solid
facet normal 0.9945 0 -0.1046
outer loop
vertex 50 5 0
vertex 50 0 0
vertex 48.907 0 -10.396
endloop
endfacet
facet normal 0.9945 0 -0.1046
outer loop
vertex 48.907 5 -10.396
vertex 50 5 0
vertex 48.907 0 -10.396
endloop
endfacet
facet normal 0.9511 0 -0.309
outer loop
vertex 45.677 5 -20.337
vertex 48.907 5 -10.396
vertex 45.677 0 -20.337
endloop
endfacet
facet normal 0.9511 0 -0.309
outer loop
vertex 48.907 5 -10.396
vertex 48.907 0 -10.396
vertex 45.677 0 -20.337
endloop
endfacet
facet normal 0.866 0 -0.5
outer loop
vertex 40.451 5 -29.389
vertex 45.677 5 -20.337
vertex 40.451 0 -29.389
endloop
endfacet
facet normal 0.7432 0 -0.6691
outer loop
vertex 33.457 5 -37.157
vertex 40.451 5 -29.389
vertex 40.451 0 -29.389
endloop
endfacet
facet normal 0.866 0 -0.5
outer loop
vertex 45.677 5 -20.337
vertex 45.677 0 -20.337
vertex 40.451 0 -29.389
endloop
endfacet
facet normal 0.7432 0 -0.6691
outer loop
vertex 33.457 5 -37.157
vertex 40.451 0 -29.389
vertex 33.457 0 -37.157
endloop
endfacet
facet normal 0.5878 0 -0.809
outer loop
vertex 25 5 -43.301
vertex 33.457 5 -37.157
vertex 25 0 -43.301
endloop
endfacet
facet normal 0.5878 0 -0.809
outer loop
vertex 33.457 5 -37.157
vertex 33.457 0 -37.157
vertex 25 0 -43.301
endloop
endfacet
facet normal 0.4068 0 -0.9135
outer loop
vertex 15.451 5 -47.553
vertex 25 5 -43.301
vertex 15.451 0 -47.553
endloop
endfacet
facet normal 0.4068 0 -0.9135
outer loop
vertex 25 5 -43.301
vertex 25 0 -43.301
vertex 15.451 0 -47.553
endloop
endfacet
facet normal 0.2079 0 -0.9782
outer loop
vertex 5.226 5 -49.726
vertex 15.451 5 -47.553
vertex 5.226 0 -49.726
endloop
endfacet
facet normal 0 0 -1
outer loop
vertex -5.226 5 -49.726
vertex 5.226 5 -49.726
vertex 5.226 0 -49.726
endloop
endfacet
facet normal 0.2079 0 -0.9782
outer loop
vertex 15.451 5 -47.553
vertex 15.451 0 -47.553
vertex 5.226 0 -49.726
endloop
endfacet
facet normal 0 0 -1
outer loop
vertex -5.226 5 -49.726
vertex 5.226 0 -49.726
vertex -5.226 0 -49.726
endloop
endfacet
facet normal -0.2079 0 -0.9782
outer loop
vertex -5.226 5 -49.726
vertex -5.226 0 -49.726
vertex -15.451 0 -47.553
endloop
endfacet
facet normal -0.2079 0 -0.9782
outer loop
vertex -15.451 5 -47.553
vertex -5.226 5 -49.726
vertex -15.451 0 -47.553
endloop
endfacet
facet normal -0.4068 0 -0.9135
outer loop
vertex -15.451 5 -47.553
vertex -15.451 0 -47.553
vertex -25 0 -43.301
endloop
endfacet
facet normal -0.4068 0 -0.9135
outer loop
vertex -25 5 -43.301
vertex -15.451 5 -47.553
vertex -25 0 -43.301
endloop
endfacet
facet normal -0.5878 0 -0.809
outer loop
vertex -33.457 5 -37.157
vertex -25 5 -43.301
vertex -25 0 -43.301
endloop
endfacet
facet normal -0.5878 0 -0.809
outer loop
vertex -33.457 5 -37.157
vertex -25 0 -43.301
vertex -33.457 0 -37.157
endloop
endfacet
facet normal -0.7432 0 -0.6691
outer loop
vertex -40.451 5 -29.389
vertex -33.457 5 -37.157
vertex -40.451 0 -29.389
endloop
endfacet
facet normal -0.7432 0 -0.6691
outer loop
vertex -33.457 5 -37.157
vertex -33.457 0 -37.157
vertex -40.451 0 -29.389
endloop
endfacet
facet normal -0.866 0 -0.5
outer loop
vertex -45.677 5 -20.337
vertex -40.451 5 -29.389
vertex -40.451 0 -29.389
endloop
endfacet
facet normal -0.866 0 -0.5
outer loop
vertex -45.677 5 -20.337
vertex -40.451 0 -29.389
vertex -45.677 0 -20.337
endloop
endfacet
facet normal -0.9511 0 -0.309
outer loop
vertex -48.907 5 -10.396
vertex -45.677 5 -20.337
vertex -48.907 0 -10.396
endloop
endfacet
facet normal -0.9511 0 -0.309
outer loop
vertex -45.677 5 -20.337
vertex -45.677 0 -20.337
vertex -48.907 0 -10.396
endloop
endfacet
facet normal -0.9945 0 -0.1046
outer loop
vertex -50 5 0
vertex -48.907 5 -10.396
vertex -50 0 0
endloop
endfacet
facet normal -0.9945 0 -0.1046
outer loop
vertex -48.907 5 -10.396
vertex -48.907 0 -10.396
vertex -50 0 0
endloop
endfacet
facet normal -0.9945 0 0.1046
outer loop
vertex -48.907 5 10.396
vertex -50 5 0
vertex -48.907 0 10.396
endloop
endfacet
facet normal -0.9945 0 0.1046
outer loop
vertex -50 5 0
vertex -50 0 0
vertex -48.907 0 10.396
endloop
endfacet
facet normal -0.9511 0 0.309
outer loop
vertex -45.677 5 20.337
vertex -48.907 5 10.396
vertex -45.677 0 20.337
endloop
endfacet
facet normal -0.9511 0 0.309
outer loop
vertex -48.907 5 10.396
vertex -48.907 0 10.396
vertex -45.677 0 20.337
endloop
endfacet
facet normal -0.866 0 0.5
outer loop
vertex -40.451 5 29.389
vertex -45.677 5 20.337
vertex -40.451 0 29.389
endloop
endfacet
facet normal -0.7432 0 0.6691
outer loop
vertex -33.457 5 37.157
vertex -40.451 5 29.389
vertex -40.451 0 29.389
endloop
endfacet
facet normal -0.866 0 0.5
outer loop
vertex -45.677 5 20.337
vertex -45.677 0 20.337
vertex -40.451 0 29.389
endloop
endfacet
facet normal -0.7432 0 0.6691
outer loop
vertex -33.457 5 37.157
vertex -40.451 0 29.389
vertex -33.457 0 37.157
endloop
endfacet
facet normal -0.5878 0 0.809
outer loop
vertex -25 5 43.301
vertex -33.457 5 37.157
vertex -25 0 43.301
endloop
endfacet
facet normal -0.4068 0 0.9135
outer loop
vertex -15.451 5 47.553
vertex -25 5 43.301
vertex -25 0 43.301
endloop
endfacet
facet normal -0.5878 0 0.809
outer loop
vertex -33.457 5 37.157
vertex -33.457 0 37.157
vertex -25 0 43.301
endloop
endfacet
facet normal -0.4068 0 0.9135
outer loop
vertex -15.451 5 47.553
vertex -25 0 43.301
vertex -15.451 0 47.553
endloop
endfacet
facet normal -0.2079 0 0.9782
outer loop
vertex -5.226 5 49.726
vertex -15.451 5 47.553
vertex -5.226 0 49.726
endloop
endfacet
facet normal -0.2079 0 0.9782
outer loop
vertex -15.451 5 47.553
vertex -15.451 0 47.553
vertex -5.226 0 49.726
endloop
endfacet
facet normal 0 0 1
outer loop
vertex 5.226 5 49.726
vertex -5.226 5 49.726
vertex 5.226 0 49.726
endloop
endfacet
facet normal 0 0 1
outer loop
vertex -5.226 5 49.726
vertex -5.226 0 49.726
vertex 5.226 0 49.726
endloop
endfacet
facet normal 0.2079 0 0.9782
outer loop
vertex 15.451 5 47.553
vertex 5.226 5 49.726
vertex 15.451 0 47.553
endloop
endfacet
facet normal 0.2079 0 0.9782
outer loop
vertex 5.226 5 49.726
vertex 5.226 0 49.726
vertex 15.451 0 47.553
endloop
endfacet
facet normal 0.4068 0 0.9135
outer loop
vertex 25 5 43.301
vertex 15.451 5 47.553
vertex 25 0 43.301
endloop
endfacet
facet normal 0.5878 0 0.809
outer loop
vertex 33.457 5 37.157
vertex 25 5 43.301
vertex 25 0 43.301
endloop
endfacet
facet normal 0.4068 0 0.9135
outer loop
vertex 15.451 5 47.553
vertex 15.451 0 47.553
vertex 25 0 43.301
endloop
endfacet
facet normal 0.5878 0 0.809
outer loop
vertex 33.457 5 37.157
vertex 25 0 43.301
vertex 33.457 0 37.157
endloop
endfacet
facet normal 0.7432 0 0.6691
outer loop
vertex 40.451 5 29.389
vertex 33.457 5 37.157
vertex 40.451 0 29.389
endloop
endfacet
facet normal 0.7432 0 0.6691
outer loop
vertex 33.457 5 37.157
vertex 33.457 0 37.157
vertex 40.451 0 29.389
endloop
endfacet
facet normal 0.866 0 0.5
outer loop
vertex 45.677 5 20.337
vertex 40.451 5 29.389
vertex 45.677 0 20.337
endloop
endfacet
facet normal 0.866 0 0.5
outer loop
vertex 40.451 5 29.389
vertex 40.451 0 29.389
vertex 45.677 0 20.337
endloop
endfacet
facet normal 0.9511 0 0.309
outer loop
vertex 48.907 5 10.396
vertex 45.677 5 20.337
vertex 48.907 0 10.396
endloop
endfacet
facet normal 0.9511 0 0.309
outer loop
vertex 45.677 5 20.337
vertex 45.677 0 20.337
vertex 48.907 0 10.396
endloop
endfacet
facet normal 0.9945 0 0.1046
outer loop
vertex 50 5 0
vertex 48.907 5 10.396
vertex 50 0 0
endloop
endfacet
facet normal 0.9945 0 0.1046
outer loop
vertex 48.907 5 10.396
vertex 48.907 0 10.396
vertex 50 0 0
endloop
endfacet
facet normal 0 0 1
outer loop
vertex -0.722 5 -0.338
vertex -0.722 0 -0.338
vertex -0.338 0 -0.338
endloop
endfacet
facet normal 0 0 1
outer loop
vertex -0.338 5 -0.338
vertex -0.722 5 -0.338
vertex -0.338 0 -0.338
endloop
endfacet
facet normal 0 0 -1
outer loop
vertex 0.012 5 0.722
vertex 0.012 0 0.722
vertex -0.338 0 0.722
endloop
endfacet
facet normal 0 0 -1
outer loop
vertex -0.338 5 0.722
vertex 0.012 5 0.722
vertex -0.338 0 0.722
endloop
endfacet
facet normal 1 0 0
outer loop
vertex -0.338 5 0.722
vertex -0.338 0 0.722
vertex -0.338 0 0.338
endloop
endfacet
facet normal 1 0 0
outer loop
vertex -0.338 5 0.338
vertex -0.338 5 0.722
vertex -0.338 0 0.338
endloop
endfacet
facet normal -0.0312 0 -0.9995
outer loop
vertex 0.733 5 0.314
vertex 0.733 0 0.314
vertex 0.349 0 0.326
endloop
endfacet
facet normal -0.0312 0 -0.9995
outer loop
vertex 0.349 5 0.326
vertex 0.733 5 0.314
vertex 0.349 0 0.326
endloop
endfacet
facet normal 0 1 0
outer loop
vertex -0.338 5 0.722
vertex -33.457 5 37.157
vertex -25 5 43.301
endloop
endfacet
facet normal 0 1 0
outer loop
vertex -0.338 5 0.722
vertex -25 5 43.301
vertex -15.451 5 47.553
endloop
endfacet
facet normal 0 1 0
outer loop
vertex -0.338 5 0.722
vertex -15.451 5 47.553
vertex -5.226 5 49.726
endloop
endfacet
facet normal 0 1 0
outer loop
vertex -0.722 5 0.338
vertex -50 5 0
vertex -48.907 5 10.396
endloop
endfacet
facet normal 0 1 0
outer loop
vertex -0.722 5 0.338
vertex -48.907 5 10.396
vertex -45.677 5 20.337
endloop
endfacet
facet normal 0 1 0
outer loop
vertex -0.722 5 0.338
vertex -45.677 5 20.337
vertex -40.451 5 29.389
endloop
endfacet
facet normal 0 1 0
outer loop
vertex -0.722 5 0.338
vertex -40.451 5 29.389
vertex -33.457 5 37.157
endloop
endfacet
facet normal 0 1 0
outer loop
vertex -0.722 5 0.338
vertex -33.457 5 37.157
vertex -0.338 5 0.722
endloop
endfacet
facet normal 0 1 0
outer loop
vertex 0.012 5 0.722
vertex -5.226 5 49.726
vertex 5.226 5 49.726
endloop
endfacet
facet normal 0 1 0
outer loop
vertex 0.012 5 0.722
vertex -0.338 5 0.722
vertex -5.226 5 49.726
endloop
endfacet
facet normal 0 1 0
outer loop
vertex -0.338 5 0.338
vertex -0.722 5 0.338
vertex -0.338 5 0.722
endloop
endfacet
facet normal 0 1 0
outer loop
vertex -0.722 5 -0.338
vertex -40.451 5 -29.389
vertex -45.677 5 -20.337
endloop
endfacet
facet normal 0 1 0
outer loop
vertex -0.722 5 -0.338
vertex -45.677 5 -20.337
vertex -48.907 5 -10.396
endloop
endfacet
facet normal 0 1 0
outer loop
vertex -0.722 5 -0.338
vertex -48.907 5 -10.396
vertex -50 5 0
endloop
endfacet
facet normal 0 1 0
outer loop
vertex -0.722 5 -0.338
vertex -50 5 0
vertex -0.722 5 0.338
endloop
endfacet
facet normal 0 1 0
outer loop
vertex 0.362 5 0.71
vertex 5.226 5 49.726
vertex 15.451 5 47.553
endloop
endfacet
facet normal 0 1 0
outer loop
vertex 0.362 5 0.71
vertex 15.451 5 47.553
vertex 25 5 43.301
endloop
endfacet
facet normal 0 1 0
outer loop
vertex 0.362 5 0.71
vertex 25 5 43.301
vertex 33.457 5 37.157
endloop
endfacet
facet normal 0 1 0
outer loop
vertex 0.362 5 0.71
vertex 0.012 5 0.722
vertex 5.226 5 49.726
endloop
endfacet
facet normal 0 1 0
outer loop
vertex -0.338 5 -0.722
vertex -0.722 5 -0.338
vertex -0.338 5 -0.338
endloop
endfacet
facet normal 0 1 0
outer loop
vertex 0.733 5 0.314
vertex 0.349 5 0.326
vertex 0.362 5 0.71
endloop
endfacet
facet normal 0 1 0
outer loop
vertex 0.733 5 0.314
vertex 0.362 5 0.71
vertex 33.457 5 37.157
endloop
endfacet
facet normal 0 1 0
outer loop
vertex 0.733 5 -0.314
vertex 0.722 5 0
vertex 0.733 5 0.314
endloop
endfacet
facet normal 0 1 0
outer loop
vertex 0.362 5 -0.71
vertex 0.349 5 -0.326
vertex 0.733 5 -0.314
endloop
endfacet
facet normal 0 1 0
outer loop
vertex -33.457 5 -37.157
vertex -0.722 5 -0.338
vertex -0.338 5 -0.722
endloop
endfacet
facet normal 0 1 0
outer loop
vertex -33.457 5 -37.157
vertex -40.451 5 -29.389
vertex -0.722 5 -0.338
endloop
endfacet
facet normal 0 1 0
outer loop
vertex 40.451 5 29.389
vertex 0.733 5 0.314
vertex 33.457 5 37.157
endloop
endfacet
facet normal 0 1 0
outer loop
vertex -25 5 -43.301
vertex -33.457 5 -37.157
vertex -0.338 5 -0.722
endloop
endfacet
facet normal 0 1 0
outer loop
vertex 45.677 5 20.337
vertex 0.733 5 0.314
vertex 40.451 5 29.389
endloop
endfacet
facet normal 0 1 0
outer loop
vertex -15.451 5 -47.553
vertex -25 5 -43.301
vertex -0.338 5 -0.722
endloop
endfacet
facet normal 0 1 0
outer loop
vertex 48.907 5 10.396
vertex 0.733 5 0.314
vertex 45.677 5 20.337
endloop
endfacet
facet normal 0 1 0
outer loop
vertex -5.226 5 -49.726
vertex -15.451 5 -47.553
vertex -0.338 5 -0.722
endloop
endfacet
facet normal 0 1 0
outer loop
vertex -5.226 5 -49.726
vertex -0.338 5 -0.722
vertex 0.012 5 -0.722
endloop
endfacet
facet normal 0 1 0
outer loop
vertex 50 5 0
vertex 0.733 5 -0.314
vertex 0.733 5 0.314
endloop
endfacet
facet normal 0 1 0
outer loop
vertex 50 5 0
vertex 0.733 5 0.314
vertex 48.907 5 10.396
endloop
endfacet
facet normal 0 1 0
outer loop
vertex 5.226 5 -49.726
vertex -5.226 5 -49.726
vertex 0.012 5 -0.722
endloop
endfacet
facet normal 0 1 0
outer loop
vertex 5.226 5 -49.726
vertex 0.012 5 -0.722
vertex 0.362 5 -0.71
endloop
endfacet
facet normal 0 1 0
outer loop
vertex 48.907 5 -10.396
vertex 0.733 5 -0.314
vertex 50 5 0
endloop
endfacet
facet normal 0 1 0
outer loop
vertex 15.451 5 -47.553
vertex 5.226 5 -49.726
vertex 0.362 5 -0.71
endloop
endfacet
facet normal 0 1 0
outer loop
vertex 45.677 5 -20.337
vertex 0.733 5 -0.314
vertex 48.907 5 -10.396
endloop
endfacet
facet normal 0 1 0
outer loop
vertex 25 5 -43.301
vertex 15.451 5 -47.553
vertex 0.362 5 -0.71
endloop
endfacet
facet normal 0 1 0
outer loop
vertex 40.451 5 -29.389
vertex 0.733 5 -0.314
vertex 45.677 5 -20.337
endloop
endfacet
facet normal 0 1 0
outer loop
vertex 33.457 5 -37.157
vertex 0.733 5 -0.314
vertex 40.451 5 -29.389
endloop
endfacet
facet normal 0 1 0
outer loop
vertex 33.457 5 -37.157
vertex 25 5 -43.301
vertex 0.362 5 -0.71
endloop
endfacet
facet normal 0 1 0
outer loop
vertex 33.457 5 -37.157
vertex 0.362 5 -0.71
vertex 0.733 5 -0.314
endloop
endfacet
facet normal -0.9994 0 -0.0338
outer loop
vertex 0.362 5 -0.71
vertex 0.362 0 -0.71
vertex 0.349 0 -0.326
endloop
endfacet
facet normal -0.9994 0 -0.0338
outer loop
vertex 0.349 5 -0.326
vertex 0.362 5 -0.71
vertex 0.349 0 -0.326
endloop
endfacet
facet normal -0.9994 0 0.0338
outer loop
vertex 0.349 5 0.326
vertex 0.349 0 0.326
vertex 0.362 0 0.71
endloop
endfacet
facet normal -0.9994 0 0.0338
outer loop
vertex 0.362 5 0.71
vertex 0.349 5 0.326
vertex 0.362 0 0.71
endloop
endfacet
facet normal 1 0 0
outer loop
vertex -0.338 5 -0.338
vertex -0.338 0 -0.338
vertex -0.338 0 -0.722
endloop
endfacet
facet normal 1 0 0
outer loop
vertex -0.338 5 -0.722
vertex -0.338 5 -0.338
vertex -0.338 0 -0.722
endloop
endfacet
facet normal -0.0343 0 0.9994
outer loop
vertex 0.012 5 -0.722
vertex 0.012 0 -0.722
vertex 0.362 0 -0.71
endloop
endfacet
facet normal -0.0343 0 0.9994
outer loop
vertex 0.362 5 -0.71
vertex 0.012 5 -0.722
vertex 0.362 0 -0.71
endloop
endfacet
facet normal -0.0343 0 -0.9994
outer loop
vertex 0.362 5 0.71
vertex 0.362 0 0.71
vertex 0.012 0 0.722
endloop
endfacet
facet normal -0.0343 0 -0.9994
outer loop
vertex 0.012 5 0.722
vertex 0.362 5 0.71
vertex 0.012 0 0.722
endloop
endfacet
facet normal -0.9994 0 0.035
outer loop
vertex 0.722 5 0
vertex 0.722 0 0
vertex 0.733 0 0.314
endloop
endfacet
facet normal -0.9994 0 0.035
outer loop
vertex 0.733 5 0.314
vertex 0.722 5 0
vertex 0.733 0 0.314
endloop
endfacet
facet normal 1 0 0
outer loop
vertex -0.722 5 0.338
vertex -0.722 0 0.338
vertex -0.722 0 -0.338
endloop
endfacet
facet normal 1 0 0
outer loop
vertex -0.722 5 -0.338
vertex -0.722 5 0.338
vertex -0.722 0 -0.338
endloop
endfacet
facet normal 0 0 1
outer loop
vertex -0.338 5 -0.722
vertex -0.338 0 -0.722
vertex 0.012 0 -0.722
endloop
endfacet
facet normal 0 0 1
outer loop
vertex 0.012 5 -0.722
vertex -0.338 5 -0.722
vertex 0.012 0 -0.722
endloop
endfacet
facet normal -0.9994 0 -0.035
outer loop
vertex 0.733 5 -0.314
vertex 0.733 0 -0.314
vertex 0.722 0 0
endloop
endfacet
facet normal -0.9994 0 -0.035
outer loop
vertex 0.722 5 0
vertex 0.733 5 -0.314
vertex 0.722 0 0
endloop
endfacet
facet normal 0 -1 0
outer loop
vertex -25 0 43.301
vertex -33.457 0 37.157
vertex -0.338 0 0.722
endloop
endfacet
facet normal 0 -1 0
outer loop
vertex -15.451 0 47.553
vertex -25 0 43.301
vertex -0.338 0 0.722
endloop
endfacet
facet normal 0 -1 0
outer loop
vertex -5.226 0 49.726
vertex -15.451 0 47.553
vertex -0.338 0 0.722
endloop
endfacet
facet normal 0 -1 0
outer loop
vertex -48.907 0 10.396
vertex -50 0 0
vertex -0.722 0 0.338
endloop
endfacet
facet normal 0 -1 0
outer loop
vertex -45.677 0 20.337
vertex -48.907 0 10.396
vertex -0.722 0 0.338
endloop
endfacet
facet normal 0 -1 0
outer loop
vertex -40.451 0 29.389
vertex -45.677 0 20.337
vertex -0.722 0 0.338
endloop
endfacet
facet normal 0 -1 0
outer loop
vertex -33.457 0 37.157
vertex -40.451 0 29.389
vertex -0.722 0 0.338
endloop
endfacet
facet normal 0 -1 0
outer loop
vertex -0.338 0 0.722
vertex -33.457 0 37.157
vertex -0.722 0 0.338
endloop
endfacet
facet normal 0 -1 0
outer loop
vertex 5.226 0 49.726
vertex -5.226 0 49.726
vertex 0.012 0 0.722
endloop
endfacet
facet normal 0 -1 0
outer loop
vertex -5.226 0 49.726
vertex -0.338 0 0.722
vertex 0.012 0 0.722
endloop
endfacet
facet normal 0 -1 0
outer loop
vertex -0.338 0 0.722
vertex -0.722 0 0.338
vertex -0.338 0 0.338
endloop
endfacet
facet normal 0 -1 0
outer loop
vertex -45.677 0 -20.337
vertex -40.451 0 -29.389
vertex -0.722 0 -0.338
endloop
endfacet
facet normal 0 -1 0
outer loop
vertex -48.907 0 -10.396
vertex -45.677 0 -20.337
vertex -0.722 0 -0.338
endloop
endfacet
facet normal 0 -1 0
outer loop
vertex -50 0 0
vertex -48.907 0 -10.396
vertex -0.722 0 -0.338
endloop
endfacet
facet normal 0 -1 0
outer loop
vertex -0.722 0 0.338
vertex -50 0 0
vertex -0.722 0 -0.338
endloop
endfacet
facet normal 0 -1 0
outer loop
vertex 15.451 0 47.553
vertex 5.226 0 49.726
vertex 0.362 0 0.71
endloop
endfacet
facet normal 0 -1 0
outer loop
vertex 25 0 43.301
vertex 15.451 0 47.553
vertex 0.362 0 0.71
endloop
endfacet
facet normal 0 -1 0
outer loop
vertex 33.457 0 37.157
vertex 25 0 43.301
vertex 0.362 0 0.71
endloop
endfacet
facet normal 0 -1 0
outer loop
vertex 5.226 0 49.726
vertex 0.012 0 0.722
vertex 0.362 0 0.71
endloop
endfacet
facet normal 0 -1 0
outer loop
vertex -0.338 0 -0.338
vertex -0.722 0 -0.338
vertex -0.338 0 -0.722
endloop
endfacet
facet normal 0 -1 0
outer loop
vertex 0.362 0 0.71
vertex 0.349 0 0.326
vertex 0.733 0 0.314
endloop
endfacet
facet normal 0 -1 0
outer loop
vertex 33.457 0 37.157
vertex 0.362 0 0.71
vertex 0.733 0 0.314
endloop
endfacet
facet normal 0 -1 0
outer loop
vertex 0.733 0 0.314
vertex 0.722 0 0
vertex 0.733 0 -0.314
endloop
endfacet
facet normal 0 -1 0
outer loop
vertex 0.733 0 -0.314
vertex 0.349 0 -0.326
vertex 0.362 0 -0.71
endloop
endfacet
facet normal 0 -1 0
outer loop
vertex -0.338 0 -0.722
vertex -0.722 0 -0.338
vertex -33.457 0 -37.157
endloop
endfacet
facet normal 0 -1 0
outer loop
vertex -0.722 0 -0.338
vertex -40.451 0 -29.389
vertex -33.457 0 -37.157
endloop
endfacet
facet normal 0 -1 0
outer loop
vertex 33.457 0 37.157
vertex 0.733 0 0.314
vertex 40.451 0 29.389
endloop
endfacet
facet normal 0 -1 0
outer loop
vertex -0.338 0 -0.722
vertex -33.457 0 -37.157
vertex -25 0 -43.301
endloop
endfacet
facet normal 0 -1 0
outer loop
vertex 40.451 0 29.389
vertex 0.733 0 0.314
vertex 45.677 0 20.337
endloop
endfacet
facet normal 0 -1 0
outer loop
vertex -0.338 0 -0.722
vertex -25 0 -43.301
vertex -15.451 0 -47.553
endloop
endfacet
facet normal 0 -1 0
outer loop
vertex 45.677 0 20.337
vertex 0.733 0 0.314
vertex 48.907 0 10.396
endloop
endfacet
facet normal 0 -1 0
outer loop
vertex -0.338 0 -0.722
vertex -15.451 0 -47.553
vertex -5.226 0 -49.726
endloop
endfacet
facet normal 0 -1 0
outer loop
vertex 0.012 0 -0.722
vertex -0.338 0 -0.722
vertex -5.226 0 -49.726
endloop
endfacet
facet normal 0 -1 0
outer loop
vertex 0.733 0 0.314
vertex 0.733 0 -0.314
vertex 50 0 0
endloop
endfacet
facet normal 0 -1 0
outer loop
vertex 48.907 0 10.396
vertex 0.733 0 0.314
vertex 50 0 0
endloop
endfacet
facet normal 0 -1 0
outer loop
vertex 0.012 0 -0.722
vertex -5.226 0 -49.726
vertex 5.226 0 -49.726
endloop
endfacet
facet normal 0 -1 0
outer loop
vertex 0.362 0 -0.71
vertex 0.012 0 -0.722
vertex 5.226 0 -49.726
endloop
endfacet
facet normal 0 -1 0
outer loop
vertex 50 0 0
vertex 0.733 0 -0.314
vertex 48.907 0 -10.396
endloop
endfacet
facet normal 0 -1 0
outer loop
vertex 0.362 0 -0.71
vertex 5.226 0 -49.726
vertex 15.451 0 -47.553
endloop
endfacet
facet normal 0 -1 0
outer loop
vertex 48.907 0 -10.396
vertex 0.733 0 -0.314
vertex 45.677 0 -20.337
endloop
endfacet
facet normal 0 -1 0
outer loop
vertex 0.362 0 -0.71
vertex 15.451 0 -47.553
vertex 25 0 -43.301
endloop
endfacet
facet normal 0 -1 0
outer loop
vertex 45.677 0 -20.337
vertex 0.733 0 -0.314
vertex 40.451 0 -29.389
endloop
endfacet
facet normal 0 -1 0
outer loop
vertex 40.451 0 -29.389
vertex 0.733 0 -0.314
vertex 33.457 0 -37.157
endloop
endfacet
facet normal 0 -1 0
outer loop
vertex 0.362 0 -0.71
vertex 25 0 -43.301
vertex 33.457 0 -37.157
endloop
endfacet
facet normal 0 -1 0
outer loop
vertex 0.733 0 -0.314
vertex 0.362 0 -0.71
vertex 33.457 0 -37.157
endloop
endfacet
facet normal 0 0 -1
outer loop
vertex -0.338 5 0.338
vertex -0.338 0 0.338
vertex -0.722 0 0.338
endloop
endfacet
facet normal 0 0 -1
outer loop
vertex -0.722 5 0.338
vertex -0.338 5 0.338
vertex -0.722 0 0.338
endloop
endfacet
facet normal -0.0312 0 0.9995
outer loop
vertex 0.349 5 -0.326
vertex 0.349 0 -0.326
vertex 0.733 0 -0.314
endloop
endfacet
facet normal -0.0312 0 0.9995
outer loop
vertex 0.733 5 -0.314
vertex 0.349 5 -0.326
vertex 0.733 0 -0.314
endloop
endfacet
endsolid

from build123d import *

# Parameters (mm, degrees)
SKETCH1_R           = 50
BOSS_EXTRUDE1_DEPTH = 5


with BuildPart() as part:
    # Sketch1 → Boss-Extrude1 (new body)
    with BuildSketch(Plane(origin=(0, 0, 0), x_dir=(1, 0, 0), z_dir=(0, 1, 0))):
        Circle(SKETCH1_R)
        Polygon((0.012163769, -0.721880139), (-0.338076022, -0.721880139), (-0.338076022, -0.338076022), (-0.721880139, -0.338076022), (-0.721880139, -0.012163769), (-0.721880139, 0.012163769), (-0.721880139, 0.338076022), (-0.338076022, 0.338076022), (-0.338076022, 0.721880139), (0.012163769, 0.721880139), (0.362204732, 0.710080322), (0.34927411, 0.326494088), (0.732860345, 0.313563466), (0.722290178, 0), (0.732860345, -0.313563466), (0.34927411, -0.326494088), (0.362204732, -0.710080322), align=None, mode=Mode.SUBTRACT)
    extrude(amount=BOSS_EXTRUDE1_DEPTH)


solid = part.part
